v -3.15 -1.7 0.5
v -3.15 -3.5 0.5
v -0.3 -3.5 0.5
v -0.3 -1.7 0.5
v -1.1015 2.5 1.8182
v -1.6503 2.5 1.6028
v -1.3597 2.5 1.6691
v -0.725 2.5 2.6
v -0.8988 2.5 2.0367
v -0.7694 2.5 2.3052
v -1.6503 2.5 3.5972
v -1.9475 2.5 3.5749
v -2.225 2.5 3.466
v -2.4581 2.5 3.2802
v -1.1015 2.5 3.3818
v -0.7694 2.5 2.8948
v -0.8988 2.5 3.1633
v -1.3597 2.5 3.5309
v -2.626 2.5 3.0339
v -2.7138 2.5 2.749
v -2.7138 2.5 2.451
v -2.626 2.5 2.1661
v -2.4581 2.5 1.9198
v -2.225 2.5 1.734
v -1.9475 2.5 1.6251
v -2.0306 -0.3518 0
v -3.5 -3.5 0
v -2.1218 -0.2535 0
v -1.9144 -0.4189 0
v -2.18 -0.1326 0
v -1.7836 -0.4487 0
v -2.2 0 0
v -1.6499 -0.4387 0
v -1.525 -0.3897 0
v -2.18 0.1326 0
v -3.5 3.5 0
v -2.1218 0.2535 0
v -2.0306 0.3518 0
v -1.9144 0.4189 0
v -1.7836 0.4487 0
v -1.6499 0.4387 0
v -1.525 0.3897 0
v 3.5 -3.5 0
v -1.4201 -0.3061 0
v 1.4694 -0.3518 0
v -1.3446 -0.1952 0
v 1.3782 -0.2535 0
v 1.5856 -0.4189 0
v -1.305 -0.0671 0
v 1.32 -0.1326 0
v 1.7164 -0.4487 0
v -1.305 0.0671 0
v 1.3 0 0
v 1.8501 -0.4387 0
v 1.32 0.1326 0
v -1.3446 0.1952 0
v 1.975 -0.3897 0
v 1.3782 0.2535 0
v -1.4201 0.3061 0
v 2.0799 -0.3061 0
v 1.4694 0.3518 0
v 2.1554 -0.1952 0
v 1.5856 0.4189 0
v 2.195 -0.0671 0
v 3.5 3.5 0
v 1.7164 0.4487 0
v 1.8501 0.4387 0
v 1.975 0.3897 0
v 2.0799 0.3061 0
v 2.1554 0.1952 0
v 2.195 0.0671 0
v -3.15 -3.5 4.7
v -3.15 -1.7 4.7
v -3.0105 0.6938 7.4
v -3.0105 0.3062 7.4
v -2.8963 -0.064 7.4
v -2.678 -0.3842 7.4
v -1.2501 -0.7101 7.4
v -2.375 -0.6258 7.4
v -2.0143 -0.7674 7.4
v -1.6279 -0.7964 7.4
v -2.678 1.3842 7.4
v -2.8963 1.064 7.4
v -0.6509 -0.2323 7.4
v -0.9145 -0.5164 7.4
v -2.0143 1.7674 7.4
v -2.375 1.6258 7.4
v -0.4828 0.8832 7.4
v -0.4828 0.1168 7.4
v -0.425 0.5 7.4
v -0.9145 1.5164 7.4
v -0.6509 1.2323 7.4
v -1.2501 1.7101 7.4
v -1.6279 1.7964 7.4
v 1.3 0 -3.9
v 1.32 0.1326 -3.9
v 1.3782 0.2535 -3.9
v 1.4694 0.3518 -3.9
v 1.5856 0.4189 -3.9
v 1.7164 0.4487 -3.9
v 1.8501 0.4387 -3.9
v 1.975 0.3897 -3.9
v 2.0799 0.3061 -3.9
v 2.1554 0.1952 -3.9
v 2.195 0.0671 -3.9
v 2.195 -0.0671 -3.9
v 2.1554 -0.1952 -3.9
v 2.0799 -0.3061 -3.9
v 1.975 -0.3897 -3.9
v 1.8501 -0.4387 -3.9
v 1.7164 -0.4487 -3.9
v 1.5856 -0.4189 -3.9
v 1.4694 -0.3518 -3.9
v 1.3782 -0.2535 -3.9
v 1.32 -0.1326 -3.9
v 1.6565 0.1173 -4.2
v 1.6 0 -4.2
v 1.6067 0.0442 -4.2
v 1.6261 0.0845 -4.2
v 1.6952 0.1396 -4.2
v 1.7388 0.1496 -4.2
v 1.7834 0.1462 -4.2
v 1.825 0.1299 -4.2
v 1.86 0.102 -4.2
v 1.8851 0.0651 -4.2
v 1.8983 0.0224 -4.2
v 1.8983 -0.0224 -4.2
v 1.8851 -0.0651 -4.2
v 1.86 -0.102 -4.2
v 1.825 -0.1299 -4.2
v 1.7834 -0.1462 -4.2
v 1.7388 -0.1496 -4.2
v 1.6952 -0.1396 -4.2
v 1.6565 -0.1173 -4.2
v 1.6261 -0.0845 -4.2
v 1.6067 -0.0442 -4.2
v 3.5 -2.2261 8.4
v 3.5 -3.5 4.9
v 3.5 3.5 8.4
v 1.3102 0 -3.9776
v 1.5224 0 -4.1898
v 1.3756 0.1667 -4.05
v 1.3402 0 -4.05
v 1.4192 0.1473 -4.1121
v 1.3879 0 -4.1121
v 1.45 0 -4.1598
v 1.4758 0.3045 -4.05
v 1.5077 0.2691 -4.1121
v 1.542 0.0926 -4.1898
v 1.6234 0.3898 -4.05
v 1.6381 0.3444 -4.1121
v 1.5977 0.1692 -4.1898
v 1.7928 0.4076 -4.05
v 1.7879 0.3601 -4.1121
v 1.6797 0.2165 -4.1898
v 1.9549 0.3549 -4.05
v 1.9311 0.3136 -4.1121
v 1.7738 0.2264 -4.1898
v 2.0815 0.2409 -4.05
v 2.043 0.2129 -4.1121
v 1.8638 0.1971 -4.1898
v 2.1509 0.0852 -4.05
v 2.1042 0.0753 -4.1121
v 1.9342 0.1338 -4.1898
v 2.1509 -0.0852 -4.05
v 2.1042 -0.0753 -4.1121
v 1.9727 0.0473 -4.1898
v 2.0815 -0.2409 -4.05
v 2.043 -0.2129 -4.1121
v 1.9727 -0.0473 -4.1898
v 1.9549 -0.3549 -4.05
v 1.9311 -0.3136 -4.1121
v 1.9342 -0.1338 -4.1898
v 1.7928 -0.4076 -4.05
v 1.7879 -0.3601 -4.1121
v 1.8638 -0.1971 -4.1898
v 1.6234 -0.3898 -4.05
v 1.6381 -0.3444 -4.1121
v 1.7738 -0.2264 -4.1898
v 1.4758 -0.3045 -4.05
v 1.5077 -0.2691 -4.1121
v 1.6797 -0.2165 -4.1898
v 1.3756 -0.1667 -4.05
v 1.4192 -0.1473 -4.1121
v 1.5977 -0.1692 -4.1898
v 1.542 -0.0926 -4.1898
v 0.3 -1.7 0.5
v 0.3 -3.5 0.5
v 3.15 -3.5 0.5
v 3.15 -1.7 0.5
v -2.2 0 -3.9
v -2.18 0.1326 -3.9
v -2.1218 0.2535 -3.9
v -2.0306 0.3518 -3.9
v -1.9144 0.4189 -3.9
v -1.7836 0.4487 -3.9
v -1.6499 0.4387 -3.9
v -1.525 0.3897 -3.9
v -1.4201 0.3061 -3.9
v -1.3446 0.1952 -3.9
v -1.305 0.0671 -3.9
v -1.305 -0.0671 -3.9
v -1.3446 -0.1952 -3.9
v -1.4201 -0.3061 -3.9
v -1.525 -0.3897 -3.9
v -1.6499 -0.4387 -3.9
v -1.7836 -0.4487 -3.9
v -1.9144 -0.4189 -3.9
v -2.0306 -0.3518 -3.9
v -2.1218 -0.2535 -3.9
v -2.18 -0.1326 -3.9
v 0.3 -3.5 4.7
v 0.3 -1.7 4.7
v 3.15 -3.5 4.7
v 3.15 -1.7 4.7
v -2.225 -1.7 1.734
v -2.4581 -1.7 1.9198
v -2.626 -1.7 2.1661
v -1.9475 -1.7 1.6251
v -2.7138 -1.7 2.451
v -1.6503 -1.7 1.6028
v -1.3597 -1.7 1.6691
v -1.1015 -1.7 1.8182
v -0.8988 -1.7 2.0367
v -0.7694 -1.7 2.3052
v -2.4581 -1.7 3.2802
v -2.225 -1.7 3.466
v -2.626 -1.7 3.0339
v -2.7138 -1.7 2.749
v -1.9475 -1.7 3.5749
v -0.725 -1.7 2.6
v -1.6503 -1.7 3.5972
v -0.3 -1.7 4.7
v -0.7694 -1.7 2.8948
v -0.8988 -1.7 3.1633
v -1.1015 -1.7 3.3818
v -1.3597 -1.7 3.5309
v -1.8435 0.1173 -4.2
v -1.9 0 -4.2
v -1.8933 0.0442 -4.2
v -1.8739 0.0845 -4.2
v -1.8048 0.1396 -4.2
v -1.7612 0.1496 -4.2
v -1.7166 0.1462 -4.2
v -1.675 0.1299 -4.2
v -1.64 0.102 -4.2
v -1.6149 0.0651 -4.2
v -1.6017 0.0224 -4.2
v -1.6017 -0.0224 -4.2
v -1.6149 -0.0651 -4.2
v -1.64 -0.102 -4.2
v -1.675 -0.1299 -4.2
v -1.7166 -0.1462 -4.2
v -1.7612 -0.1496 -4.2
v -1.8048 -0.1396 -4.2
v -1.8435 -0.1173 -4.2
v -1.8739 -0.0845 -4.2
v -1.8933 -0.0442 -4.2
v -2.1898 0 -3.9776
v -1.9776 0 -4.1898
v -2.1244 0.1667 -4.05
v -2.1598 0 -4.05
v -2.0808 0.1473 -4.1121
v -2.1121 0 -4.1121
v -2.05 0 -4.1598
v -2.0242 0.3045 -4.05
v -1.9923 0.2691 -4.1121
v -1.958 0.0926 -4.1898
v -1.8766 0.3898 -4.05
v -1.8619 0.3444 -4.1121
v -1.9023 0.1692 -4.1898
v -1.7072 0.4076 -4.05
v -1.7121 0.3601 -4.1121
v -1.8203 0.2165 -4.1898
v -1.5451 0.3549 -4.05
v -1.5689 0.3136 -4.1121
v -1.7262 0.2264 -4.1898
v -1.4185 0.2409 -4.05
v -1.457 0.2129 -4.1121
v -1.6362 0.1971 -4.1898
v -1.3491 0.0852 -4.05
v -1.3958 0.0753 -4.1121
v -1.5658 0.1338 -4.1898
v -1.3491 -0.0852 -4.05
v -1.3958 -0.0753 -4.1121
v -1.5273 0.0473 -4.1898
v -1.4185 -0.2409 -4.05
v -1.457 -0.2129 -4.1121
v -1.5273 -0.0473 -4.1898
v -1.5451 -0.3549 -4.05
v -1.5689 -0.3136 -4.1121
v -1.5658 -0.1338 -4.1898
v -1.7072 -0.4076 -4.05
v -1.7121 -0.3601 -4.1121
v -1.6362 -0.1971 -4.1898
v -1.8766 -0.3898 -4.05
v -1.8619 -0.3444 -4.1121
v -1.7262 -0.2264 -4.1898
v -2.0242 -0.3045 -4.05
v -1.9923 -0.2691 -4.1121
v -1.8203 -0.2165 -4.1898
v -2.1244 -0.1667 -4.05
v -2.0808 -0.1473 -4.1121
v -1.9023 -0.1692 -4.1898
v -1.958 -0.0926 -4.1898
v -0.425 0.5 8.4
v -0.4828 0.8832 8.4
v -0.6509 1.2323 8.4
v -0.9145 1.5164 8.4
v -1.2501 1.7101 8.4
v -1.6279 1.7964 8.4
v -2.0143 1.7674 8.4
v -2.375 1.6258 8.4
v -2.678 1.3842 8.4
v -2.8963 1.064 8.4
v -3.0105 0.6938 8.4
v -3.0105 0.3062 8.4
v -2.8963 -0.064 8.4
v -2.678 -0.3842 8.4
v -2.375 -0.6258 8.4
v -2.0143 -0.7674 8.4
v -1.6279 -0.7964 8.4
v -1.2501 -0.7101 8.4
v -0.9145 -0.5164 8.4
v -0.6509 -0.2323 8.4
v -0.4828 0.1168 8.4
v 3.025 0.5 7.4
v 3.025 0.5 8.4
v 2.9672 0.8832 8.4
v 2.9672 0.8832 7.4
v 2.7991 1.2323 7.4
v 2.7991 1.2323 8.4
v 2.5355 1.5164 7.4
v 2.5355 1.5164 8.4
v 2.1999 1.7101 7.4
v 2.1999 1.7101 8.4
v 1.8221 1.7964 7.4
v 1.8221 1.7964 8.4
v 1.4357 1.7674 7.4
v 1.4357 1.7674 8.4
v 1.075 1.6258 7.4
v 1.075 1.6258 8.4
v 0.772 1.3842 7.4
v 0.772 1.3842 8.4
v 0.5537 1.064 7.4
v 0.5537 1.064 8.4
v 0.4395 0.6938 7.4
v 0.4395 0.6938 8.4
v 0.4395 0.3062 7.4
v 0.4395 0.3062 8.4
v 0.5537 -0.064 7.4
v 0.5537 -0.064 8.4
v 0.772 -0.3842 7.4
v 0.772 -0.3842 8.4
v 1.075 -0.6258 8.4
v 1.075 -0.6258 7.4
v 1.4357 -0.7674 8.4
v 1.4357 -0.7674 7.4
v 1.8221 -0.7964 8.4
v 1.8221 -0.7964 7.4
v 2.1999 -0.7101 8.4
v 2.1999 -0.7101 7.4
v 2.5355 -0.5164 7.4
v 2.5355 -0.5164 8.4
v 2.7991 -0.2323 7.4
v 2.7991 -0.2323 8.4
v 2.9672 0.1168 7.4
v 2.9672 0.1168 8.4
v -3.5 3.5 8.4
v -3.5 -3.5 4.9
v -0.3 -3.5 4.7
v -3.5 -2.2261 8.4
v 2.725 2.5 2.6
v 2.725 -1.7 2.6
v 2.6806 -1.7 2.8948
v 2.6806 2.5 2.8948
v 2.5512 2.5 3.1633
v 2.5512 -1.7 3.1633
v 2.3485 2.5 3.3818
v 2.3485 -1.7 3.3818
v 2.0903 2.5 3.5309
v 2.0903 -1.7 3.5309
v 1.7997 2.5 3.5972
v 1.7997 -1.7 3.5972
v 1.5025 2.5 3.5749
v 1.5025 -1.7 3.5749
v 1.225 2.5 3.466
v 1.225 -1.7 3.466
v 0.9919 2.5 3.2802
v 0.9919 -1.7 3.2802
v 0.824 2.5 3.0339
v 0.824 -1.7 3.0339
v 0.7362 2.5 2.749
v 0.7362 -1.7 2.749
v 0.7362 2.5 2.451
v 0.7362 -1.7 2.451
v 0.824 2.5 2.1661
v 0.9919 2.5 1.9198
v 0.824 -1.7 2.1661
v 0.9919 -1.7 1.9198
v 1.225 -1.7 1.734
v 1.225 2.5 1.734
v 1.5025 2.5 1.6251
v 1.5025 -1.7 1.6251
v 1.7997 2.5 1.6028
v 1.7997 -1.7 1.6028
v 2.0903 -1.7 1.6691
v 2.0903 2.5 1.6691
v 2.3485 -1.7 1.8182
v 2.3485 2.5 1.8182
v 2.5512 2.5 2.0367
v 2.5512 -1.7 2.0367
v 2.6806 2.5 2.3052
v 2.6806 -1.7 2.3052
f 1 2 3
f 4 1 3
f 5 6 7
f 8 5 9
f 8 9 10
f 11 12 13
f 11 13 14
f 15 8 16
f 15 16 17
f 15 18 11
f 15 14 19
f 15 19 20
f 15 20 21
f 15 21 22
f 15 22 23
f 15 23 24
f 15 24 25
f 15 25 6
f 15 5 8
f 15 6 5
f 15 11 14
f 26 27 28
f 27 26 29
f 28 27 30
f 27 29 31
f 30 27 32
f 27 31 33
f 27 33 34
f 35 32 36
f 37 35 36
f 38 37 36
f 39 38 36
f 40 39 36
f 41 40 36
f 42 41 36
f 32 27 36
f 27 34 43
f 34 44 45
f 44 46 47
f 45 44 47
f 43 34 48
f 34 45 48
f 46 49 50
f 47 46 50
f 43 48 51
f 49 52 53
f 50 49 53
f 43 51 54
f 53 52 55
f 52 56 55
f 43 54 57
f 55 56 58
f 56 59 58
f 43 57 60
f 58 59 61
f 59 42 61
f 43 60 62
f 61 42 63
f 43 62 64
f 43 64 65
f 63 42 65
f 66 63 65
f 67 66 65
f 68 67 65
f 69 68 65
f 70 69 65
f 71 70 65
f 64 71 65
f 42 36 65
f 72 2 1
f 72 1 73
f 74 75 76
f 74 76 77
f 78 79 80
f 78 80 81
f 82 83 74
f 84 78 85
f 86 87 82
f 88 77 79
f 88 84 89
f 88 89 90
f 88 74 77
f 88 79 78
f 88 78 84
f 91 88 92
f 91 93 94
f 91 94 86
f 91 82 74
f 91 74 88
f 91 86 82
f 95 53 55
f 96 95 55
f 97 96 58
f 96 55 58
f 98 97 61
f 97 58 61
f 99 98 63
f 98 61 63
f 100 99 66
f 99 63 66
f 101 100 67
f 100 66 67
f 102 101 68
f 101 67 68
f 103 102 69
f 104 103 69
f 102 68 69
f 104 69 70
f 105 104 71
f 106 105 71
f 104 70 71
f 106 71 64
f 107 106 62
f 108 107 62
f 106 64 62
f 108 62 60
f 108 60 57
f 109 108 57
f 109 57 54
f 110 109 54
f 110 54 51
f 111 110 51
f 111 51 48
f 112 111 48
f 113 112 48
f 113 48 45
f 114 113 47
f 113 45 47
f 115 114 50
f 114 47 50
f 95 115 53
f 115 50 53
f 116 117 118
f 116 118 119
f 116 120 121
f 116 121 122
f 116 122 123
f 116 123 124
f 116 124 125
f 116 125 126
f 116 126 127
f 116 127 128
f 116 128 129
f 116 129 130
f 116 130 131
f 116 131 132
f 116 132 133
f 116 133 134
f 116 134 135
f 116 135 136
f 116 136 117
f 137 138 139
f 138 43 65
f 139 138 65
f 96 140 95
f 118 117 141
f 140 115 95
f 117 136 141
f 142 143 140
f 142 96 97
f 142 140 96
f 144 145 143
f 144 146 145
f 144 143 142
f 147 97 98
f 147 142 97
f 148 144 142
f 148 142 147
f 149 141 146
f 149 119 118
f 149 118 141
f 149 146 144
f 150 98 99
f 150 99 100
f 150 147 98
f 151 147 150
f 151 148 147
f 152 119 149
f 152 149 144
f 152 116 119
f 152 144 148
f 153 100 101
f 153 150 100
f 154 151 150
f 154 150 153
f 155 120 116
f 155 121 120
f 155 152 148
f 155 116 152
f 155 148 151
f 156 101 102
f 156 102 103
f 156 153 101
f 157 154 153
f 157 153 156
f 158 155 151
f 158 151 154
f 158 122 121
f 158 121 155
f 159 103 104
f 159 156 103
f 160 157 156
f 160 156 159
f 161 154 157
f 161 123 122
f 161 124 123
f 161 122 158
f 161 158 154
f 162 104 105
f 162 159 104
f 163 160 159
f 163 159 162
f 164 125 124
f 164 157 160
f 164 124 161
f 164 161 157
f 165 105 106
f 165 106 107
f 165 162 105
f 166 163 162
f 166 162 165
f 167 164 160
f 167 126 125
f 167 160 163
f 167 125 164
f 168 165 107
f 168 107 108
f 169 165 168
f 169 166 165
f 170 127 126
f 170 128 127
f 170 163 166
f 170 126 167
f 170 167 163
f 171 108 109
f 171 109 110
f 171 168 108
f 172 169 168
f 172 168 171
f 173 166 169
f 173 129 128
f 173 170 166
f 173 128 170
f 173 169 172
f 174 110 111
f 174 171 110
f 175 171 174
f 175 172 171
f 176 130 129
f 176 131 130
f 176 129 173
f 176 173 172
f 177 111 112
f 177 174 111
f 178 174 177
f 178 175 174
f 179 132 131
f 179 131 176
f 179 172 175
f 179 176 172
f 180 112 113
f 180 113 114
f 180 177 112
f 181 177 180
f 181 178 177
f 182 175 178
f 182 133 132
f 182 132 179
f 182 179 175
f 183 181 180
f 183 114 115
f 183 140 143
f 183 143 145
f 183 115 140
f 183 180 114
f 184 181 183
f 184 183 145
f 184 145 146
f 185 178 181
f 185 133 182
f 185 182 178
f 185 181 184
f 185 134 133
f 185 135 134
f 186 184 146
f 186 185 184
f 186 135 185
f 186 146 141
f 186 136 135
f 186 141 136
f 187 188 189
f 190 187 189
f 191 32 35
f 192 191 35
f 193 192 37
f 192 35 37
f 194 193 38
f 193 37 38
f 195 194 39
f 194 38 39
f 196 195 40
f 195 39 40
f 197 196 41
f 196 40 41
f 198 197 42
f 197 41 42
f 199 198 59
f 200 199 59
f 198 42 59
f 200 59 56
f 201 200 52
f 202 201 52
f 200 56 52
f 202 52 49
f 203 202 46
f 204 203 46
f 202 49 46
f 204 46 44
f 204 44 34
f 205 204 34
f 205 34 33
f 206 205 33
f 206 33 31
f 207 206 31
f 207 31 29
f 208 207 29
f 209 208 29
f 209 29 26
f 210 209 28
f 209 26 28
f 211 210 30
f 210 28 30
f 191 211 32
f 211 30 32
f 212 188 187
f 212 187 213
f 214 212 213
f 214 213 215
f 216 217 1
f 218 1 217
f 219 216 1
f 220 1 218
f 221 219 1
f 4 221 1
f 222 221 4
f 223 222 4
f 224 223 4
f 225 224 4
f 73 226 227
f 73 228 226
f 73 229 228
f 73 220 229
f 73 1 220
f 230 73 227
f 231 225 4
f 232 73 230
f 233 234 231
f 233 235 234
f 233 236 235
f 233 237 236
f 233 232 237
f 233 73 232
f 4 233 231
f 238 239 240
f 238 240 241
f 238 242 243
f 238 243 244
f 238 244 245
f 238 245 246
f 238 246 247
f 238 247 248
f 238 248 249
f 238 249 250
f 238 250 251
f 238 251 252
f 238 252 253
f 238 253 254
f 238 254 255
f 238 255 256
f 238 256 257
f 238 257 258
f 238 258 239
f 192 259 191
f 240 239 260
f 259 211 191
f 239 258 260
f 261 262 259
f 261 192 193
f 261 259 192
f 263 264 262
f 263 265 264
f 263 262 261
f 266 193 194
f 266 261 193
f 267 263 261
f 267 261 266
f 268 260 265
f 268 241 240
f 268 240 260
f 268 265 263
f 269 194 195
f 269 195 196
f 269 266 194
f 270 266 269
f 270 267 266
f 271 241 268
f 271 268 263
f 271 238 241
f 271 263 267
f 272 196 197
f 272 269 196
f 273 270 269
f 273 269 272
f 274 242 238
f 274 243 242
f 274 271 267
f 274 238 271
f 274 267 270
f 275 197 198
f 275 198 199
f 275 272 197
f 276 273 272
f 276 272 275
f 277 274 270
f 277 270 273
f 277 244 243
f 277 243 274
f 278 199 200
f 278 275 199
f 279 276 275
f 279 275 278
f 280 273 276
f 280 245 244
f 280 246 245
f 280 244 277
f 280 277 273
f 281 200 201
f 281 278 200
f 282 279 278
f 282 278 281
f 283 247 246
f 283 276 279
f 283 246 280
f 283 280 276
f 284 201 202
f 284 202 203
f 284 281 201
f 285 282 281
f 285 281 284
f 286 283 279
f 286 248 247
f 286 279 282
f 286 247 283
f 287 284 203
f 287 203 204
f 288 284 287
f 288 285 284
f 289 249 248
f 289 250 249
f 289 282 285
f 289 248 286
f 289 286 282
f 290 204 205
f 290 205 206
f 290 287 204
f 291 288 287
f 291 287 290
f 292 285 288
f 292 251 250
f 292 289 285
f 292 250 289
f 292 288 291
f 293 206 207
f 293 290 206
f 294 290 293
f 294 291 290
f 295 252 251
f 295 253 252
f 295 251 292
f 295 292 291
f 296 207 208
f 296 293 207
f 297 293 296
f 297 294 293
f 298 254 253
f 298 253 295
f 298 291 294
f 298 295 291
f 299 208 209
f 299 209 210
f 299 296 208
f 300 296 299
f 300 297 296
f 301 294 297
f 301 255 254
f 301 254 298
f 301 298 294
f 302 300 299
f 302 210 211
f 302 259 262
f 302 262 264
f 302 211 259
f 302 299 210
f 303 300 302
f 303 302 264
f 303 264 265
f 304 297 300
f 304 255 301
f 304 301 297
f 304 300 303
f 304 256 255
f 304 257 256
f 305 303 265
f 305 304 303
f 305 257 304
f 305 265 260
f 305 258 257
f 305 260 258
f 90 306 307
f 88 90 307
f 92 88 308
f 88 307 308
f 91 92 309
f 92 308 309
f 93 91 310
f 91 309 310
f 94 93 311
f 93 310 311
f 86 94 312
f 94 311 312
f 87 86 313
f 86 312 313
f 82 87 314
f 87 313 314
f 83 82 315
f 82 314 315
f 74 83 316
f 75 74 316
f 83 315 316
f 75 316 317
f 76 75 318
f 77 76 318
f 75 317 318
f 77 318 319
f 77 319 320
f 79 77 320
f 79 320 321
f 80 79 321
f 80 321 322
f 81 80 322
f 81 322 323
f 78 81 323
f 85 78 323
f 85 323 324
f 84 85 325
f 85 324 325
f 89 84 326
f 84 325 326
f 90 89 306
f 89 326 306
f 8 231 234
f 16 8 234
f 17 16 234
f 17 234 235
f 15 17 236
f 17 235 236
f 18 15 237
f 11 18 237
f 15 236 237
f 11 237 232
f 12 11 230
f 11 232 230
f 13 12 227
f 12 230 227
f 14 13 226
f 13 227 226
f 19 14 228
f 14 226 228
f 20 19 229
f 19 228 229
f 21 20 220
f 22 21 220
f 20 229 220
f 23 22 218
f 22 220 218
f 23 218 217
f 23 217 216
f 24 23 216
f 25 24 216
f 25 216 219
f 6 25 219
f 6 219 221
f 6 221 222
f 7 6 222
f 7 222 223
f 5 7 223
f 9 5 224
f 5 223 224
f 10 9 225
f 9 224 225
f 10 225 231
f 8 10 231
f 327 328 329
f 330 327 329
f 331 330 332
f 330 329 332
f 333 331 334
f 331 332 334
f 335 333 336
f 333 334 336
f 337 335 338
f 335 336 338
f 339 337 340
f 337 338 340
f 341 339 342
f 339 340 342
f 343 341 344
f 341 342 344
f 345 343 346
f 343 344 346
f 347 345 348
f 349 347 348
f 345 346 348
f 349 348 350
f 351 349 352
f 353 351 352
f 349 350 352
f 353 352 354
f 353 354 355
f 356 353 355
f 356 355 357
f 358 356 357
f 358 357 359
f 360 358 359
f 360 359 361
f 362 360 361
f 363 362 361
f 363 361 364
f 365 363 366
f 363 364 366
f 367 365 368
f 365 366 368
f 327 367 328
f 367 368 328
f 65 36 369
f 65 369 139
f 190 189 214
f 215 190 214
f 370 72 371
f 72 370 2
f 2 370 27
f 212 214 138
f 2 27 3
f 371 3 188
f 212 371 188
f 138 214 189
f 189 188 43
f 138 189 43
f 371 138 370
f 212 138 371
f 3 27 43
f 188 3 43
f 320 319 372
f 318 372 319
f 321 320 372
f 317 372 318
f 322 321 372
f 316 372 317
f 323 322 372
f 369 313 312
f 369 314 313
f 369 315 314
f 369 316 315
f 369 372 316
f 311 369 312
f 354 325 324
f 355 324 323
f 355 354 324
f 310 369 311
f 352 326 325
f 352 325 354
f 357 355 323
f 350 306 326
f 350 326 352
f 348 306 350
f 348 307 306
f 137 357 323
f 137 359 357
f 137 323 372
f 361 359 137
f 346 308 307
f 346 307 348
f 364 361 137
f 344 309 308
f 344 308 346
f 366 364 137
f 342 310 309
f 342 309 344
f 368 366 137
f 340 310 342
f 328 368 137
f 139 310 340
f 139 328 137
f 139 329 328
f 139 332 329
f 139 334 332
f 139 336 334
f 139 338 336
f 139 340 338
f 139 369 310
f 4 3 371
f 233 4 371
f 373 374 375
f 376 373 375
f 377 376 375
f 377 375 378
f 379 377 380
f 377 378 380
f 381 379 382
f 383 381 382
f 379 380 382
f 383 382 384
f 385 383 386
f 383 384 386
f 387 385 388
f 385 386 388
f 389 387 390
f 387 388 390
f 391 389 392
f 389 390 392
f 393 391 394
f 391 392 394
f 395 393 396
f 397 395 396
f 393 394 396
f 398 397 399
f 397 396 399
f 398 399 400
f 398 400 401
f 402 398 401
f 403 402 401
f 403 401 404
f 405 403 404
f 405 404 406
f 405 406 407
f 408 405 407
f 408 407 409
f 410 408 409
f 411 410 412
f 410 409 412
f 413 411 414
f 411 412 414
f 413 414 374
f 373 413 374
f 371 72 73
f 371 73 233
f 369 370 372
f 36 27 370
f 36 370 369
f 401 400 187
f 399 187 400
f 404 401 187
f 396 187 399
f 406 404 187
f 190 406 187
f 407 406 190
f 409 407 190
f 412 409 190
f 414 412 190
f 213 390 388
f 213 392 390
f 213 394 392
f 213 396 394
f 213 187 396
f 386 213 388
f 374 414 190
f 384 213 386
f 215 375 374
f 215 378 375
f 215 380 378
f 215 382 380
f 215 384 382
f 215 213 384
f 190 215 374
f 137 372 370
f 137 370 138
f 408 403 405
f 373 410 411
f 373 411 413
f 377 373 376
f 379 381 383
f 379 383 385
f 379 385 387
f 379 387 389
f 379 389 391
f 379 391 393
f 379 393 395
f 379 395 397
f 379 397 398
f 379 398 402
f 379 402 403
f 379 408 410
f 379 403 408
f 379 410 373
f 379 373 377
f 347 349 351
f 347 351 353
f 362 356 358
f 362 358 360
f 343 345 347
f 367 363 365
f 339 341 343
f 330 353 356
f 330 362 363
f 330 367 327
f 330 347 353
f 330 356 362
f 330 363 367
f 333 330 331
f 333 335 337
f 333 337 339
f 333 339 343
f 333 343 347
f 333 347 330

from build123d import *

# Parameters (mm, degrees)
SKETCH1_W           = 7
SKETCH1_H           = 7
BOSS_EXTRUDE1_DEPTH = 8.4
CHAMFER1_SIZE       = 3.5
CHAMFER1_SIZE2      = 1.27389582
SKETCH2_W           = 2.85
SKETCH2_H           = 4.2
CUT_EXTRUDE1_DEPTH  = 1.8
SKETCH3_R           = 1
CUT_EXTRUDE2_DEPTH  = 4.2
SKETCH4_R           = 1.3
CUT_EXTRUDE3_DEPTH  = 1
SKETCH5_R           = 0.45
BOSS_EXTRUDE2_DEPTH = 4.2
FILLET1_R           = 0.3


with BuildPart() as part:
    # Sketch1 → Boss-Extrude1 (new body)
    with BuildSketch(Plane.XY):
        Rectangle(SKETCH1_W, SKETCH1_H)
    extrude(amount=BOSS_EXTRUDE1_DEPTH)

    # Chamfer1
    chamfer1_edges = [part.edges().sort_by_distance(p)[0] for p in [
        (0, -3.5, 8.4),
    ]]
    chamfer1_side = [part.faces().sort_by_distance(p)[0] for p in [
        (0, -3.5, 4.2),
    ]]
    chamfer(chamfer1_edges, length=CHAMFER1_SIZE, length2=CHAMFER1_SIZE2, reference=chamfer1_side[0])

    # Sketch2 → Cut-Extrude1 (cut)
    with BuildSketch(Plane.XZ.offset(3.5)):
        with Locations((1.725, 2.6)):
            Rectangle(SKETCH2_W, SKETCH2_H)
        with Locations((-1.725, 2.6)):
            Rectangle(SKETCH2_W, SKETCH2_H)
    extrude(amount=-CUT_EXTRUDE1_DEPTH, mode=Mode.SUBTRACT)

    # Sketch3 → Cut-Extrude2 (cut)
    with BuildSketch(Plane.XZ.offset(1.7)):
        with Locations((-1.725, 2.6)):
            Circle(SKETCH3_R)
        with Locations((1.725, 2.6)):
            Circle(SKETCH3_R)
    extrude(amount=-CUT_EXTRUDE2_DEPTH, mode=Mode.SUBTRACT)

    # Sketch4 → Cut-Extrude3 (cut)
    with BuildSketch(Plane.XY.offset(8.4)):
        with Locations((-1.725, 0.5)):
            Circle(SKETCH4_R)
        with Locations((1.725, 0.5)):
            Circle(SKETCH4_R)
    extrude(amount=-CUT_EXTRUDE3_DEPTH, mode=Mode.SUBTRACT)

    # Sketch5 → Boss-Extrude2 (add)
    with BuildSketch(Plane(origin=(0, 0, 0), x_dir=(-1, 0, 0), z_dir=(0, 0, -1))):
        with Locations((-1.75, 0)):
            Circle(SKETCH5_R)
        with Locations((1.75, 0)):
            Circle(SKETCH5_R)
    extrude(amount=BOSS_EXTRUDE2_DEPTH)

    # Fillet1
    fillet1_edges = [part.edges().sort_by_distance(p)[0] for p in [
        (2.2, 0, -4.2),
        (-1.3, 0, -4.2),
    ]]
    fillet(fillet1_edges, radius=FILLET1_R)


solid = part.part
